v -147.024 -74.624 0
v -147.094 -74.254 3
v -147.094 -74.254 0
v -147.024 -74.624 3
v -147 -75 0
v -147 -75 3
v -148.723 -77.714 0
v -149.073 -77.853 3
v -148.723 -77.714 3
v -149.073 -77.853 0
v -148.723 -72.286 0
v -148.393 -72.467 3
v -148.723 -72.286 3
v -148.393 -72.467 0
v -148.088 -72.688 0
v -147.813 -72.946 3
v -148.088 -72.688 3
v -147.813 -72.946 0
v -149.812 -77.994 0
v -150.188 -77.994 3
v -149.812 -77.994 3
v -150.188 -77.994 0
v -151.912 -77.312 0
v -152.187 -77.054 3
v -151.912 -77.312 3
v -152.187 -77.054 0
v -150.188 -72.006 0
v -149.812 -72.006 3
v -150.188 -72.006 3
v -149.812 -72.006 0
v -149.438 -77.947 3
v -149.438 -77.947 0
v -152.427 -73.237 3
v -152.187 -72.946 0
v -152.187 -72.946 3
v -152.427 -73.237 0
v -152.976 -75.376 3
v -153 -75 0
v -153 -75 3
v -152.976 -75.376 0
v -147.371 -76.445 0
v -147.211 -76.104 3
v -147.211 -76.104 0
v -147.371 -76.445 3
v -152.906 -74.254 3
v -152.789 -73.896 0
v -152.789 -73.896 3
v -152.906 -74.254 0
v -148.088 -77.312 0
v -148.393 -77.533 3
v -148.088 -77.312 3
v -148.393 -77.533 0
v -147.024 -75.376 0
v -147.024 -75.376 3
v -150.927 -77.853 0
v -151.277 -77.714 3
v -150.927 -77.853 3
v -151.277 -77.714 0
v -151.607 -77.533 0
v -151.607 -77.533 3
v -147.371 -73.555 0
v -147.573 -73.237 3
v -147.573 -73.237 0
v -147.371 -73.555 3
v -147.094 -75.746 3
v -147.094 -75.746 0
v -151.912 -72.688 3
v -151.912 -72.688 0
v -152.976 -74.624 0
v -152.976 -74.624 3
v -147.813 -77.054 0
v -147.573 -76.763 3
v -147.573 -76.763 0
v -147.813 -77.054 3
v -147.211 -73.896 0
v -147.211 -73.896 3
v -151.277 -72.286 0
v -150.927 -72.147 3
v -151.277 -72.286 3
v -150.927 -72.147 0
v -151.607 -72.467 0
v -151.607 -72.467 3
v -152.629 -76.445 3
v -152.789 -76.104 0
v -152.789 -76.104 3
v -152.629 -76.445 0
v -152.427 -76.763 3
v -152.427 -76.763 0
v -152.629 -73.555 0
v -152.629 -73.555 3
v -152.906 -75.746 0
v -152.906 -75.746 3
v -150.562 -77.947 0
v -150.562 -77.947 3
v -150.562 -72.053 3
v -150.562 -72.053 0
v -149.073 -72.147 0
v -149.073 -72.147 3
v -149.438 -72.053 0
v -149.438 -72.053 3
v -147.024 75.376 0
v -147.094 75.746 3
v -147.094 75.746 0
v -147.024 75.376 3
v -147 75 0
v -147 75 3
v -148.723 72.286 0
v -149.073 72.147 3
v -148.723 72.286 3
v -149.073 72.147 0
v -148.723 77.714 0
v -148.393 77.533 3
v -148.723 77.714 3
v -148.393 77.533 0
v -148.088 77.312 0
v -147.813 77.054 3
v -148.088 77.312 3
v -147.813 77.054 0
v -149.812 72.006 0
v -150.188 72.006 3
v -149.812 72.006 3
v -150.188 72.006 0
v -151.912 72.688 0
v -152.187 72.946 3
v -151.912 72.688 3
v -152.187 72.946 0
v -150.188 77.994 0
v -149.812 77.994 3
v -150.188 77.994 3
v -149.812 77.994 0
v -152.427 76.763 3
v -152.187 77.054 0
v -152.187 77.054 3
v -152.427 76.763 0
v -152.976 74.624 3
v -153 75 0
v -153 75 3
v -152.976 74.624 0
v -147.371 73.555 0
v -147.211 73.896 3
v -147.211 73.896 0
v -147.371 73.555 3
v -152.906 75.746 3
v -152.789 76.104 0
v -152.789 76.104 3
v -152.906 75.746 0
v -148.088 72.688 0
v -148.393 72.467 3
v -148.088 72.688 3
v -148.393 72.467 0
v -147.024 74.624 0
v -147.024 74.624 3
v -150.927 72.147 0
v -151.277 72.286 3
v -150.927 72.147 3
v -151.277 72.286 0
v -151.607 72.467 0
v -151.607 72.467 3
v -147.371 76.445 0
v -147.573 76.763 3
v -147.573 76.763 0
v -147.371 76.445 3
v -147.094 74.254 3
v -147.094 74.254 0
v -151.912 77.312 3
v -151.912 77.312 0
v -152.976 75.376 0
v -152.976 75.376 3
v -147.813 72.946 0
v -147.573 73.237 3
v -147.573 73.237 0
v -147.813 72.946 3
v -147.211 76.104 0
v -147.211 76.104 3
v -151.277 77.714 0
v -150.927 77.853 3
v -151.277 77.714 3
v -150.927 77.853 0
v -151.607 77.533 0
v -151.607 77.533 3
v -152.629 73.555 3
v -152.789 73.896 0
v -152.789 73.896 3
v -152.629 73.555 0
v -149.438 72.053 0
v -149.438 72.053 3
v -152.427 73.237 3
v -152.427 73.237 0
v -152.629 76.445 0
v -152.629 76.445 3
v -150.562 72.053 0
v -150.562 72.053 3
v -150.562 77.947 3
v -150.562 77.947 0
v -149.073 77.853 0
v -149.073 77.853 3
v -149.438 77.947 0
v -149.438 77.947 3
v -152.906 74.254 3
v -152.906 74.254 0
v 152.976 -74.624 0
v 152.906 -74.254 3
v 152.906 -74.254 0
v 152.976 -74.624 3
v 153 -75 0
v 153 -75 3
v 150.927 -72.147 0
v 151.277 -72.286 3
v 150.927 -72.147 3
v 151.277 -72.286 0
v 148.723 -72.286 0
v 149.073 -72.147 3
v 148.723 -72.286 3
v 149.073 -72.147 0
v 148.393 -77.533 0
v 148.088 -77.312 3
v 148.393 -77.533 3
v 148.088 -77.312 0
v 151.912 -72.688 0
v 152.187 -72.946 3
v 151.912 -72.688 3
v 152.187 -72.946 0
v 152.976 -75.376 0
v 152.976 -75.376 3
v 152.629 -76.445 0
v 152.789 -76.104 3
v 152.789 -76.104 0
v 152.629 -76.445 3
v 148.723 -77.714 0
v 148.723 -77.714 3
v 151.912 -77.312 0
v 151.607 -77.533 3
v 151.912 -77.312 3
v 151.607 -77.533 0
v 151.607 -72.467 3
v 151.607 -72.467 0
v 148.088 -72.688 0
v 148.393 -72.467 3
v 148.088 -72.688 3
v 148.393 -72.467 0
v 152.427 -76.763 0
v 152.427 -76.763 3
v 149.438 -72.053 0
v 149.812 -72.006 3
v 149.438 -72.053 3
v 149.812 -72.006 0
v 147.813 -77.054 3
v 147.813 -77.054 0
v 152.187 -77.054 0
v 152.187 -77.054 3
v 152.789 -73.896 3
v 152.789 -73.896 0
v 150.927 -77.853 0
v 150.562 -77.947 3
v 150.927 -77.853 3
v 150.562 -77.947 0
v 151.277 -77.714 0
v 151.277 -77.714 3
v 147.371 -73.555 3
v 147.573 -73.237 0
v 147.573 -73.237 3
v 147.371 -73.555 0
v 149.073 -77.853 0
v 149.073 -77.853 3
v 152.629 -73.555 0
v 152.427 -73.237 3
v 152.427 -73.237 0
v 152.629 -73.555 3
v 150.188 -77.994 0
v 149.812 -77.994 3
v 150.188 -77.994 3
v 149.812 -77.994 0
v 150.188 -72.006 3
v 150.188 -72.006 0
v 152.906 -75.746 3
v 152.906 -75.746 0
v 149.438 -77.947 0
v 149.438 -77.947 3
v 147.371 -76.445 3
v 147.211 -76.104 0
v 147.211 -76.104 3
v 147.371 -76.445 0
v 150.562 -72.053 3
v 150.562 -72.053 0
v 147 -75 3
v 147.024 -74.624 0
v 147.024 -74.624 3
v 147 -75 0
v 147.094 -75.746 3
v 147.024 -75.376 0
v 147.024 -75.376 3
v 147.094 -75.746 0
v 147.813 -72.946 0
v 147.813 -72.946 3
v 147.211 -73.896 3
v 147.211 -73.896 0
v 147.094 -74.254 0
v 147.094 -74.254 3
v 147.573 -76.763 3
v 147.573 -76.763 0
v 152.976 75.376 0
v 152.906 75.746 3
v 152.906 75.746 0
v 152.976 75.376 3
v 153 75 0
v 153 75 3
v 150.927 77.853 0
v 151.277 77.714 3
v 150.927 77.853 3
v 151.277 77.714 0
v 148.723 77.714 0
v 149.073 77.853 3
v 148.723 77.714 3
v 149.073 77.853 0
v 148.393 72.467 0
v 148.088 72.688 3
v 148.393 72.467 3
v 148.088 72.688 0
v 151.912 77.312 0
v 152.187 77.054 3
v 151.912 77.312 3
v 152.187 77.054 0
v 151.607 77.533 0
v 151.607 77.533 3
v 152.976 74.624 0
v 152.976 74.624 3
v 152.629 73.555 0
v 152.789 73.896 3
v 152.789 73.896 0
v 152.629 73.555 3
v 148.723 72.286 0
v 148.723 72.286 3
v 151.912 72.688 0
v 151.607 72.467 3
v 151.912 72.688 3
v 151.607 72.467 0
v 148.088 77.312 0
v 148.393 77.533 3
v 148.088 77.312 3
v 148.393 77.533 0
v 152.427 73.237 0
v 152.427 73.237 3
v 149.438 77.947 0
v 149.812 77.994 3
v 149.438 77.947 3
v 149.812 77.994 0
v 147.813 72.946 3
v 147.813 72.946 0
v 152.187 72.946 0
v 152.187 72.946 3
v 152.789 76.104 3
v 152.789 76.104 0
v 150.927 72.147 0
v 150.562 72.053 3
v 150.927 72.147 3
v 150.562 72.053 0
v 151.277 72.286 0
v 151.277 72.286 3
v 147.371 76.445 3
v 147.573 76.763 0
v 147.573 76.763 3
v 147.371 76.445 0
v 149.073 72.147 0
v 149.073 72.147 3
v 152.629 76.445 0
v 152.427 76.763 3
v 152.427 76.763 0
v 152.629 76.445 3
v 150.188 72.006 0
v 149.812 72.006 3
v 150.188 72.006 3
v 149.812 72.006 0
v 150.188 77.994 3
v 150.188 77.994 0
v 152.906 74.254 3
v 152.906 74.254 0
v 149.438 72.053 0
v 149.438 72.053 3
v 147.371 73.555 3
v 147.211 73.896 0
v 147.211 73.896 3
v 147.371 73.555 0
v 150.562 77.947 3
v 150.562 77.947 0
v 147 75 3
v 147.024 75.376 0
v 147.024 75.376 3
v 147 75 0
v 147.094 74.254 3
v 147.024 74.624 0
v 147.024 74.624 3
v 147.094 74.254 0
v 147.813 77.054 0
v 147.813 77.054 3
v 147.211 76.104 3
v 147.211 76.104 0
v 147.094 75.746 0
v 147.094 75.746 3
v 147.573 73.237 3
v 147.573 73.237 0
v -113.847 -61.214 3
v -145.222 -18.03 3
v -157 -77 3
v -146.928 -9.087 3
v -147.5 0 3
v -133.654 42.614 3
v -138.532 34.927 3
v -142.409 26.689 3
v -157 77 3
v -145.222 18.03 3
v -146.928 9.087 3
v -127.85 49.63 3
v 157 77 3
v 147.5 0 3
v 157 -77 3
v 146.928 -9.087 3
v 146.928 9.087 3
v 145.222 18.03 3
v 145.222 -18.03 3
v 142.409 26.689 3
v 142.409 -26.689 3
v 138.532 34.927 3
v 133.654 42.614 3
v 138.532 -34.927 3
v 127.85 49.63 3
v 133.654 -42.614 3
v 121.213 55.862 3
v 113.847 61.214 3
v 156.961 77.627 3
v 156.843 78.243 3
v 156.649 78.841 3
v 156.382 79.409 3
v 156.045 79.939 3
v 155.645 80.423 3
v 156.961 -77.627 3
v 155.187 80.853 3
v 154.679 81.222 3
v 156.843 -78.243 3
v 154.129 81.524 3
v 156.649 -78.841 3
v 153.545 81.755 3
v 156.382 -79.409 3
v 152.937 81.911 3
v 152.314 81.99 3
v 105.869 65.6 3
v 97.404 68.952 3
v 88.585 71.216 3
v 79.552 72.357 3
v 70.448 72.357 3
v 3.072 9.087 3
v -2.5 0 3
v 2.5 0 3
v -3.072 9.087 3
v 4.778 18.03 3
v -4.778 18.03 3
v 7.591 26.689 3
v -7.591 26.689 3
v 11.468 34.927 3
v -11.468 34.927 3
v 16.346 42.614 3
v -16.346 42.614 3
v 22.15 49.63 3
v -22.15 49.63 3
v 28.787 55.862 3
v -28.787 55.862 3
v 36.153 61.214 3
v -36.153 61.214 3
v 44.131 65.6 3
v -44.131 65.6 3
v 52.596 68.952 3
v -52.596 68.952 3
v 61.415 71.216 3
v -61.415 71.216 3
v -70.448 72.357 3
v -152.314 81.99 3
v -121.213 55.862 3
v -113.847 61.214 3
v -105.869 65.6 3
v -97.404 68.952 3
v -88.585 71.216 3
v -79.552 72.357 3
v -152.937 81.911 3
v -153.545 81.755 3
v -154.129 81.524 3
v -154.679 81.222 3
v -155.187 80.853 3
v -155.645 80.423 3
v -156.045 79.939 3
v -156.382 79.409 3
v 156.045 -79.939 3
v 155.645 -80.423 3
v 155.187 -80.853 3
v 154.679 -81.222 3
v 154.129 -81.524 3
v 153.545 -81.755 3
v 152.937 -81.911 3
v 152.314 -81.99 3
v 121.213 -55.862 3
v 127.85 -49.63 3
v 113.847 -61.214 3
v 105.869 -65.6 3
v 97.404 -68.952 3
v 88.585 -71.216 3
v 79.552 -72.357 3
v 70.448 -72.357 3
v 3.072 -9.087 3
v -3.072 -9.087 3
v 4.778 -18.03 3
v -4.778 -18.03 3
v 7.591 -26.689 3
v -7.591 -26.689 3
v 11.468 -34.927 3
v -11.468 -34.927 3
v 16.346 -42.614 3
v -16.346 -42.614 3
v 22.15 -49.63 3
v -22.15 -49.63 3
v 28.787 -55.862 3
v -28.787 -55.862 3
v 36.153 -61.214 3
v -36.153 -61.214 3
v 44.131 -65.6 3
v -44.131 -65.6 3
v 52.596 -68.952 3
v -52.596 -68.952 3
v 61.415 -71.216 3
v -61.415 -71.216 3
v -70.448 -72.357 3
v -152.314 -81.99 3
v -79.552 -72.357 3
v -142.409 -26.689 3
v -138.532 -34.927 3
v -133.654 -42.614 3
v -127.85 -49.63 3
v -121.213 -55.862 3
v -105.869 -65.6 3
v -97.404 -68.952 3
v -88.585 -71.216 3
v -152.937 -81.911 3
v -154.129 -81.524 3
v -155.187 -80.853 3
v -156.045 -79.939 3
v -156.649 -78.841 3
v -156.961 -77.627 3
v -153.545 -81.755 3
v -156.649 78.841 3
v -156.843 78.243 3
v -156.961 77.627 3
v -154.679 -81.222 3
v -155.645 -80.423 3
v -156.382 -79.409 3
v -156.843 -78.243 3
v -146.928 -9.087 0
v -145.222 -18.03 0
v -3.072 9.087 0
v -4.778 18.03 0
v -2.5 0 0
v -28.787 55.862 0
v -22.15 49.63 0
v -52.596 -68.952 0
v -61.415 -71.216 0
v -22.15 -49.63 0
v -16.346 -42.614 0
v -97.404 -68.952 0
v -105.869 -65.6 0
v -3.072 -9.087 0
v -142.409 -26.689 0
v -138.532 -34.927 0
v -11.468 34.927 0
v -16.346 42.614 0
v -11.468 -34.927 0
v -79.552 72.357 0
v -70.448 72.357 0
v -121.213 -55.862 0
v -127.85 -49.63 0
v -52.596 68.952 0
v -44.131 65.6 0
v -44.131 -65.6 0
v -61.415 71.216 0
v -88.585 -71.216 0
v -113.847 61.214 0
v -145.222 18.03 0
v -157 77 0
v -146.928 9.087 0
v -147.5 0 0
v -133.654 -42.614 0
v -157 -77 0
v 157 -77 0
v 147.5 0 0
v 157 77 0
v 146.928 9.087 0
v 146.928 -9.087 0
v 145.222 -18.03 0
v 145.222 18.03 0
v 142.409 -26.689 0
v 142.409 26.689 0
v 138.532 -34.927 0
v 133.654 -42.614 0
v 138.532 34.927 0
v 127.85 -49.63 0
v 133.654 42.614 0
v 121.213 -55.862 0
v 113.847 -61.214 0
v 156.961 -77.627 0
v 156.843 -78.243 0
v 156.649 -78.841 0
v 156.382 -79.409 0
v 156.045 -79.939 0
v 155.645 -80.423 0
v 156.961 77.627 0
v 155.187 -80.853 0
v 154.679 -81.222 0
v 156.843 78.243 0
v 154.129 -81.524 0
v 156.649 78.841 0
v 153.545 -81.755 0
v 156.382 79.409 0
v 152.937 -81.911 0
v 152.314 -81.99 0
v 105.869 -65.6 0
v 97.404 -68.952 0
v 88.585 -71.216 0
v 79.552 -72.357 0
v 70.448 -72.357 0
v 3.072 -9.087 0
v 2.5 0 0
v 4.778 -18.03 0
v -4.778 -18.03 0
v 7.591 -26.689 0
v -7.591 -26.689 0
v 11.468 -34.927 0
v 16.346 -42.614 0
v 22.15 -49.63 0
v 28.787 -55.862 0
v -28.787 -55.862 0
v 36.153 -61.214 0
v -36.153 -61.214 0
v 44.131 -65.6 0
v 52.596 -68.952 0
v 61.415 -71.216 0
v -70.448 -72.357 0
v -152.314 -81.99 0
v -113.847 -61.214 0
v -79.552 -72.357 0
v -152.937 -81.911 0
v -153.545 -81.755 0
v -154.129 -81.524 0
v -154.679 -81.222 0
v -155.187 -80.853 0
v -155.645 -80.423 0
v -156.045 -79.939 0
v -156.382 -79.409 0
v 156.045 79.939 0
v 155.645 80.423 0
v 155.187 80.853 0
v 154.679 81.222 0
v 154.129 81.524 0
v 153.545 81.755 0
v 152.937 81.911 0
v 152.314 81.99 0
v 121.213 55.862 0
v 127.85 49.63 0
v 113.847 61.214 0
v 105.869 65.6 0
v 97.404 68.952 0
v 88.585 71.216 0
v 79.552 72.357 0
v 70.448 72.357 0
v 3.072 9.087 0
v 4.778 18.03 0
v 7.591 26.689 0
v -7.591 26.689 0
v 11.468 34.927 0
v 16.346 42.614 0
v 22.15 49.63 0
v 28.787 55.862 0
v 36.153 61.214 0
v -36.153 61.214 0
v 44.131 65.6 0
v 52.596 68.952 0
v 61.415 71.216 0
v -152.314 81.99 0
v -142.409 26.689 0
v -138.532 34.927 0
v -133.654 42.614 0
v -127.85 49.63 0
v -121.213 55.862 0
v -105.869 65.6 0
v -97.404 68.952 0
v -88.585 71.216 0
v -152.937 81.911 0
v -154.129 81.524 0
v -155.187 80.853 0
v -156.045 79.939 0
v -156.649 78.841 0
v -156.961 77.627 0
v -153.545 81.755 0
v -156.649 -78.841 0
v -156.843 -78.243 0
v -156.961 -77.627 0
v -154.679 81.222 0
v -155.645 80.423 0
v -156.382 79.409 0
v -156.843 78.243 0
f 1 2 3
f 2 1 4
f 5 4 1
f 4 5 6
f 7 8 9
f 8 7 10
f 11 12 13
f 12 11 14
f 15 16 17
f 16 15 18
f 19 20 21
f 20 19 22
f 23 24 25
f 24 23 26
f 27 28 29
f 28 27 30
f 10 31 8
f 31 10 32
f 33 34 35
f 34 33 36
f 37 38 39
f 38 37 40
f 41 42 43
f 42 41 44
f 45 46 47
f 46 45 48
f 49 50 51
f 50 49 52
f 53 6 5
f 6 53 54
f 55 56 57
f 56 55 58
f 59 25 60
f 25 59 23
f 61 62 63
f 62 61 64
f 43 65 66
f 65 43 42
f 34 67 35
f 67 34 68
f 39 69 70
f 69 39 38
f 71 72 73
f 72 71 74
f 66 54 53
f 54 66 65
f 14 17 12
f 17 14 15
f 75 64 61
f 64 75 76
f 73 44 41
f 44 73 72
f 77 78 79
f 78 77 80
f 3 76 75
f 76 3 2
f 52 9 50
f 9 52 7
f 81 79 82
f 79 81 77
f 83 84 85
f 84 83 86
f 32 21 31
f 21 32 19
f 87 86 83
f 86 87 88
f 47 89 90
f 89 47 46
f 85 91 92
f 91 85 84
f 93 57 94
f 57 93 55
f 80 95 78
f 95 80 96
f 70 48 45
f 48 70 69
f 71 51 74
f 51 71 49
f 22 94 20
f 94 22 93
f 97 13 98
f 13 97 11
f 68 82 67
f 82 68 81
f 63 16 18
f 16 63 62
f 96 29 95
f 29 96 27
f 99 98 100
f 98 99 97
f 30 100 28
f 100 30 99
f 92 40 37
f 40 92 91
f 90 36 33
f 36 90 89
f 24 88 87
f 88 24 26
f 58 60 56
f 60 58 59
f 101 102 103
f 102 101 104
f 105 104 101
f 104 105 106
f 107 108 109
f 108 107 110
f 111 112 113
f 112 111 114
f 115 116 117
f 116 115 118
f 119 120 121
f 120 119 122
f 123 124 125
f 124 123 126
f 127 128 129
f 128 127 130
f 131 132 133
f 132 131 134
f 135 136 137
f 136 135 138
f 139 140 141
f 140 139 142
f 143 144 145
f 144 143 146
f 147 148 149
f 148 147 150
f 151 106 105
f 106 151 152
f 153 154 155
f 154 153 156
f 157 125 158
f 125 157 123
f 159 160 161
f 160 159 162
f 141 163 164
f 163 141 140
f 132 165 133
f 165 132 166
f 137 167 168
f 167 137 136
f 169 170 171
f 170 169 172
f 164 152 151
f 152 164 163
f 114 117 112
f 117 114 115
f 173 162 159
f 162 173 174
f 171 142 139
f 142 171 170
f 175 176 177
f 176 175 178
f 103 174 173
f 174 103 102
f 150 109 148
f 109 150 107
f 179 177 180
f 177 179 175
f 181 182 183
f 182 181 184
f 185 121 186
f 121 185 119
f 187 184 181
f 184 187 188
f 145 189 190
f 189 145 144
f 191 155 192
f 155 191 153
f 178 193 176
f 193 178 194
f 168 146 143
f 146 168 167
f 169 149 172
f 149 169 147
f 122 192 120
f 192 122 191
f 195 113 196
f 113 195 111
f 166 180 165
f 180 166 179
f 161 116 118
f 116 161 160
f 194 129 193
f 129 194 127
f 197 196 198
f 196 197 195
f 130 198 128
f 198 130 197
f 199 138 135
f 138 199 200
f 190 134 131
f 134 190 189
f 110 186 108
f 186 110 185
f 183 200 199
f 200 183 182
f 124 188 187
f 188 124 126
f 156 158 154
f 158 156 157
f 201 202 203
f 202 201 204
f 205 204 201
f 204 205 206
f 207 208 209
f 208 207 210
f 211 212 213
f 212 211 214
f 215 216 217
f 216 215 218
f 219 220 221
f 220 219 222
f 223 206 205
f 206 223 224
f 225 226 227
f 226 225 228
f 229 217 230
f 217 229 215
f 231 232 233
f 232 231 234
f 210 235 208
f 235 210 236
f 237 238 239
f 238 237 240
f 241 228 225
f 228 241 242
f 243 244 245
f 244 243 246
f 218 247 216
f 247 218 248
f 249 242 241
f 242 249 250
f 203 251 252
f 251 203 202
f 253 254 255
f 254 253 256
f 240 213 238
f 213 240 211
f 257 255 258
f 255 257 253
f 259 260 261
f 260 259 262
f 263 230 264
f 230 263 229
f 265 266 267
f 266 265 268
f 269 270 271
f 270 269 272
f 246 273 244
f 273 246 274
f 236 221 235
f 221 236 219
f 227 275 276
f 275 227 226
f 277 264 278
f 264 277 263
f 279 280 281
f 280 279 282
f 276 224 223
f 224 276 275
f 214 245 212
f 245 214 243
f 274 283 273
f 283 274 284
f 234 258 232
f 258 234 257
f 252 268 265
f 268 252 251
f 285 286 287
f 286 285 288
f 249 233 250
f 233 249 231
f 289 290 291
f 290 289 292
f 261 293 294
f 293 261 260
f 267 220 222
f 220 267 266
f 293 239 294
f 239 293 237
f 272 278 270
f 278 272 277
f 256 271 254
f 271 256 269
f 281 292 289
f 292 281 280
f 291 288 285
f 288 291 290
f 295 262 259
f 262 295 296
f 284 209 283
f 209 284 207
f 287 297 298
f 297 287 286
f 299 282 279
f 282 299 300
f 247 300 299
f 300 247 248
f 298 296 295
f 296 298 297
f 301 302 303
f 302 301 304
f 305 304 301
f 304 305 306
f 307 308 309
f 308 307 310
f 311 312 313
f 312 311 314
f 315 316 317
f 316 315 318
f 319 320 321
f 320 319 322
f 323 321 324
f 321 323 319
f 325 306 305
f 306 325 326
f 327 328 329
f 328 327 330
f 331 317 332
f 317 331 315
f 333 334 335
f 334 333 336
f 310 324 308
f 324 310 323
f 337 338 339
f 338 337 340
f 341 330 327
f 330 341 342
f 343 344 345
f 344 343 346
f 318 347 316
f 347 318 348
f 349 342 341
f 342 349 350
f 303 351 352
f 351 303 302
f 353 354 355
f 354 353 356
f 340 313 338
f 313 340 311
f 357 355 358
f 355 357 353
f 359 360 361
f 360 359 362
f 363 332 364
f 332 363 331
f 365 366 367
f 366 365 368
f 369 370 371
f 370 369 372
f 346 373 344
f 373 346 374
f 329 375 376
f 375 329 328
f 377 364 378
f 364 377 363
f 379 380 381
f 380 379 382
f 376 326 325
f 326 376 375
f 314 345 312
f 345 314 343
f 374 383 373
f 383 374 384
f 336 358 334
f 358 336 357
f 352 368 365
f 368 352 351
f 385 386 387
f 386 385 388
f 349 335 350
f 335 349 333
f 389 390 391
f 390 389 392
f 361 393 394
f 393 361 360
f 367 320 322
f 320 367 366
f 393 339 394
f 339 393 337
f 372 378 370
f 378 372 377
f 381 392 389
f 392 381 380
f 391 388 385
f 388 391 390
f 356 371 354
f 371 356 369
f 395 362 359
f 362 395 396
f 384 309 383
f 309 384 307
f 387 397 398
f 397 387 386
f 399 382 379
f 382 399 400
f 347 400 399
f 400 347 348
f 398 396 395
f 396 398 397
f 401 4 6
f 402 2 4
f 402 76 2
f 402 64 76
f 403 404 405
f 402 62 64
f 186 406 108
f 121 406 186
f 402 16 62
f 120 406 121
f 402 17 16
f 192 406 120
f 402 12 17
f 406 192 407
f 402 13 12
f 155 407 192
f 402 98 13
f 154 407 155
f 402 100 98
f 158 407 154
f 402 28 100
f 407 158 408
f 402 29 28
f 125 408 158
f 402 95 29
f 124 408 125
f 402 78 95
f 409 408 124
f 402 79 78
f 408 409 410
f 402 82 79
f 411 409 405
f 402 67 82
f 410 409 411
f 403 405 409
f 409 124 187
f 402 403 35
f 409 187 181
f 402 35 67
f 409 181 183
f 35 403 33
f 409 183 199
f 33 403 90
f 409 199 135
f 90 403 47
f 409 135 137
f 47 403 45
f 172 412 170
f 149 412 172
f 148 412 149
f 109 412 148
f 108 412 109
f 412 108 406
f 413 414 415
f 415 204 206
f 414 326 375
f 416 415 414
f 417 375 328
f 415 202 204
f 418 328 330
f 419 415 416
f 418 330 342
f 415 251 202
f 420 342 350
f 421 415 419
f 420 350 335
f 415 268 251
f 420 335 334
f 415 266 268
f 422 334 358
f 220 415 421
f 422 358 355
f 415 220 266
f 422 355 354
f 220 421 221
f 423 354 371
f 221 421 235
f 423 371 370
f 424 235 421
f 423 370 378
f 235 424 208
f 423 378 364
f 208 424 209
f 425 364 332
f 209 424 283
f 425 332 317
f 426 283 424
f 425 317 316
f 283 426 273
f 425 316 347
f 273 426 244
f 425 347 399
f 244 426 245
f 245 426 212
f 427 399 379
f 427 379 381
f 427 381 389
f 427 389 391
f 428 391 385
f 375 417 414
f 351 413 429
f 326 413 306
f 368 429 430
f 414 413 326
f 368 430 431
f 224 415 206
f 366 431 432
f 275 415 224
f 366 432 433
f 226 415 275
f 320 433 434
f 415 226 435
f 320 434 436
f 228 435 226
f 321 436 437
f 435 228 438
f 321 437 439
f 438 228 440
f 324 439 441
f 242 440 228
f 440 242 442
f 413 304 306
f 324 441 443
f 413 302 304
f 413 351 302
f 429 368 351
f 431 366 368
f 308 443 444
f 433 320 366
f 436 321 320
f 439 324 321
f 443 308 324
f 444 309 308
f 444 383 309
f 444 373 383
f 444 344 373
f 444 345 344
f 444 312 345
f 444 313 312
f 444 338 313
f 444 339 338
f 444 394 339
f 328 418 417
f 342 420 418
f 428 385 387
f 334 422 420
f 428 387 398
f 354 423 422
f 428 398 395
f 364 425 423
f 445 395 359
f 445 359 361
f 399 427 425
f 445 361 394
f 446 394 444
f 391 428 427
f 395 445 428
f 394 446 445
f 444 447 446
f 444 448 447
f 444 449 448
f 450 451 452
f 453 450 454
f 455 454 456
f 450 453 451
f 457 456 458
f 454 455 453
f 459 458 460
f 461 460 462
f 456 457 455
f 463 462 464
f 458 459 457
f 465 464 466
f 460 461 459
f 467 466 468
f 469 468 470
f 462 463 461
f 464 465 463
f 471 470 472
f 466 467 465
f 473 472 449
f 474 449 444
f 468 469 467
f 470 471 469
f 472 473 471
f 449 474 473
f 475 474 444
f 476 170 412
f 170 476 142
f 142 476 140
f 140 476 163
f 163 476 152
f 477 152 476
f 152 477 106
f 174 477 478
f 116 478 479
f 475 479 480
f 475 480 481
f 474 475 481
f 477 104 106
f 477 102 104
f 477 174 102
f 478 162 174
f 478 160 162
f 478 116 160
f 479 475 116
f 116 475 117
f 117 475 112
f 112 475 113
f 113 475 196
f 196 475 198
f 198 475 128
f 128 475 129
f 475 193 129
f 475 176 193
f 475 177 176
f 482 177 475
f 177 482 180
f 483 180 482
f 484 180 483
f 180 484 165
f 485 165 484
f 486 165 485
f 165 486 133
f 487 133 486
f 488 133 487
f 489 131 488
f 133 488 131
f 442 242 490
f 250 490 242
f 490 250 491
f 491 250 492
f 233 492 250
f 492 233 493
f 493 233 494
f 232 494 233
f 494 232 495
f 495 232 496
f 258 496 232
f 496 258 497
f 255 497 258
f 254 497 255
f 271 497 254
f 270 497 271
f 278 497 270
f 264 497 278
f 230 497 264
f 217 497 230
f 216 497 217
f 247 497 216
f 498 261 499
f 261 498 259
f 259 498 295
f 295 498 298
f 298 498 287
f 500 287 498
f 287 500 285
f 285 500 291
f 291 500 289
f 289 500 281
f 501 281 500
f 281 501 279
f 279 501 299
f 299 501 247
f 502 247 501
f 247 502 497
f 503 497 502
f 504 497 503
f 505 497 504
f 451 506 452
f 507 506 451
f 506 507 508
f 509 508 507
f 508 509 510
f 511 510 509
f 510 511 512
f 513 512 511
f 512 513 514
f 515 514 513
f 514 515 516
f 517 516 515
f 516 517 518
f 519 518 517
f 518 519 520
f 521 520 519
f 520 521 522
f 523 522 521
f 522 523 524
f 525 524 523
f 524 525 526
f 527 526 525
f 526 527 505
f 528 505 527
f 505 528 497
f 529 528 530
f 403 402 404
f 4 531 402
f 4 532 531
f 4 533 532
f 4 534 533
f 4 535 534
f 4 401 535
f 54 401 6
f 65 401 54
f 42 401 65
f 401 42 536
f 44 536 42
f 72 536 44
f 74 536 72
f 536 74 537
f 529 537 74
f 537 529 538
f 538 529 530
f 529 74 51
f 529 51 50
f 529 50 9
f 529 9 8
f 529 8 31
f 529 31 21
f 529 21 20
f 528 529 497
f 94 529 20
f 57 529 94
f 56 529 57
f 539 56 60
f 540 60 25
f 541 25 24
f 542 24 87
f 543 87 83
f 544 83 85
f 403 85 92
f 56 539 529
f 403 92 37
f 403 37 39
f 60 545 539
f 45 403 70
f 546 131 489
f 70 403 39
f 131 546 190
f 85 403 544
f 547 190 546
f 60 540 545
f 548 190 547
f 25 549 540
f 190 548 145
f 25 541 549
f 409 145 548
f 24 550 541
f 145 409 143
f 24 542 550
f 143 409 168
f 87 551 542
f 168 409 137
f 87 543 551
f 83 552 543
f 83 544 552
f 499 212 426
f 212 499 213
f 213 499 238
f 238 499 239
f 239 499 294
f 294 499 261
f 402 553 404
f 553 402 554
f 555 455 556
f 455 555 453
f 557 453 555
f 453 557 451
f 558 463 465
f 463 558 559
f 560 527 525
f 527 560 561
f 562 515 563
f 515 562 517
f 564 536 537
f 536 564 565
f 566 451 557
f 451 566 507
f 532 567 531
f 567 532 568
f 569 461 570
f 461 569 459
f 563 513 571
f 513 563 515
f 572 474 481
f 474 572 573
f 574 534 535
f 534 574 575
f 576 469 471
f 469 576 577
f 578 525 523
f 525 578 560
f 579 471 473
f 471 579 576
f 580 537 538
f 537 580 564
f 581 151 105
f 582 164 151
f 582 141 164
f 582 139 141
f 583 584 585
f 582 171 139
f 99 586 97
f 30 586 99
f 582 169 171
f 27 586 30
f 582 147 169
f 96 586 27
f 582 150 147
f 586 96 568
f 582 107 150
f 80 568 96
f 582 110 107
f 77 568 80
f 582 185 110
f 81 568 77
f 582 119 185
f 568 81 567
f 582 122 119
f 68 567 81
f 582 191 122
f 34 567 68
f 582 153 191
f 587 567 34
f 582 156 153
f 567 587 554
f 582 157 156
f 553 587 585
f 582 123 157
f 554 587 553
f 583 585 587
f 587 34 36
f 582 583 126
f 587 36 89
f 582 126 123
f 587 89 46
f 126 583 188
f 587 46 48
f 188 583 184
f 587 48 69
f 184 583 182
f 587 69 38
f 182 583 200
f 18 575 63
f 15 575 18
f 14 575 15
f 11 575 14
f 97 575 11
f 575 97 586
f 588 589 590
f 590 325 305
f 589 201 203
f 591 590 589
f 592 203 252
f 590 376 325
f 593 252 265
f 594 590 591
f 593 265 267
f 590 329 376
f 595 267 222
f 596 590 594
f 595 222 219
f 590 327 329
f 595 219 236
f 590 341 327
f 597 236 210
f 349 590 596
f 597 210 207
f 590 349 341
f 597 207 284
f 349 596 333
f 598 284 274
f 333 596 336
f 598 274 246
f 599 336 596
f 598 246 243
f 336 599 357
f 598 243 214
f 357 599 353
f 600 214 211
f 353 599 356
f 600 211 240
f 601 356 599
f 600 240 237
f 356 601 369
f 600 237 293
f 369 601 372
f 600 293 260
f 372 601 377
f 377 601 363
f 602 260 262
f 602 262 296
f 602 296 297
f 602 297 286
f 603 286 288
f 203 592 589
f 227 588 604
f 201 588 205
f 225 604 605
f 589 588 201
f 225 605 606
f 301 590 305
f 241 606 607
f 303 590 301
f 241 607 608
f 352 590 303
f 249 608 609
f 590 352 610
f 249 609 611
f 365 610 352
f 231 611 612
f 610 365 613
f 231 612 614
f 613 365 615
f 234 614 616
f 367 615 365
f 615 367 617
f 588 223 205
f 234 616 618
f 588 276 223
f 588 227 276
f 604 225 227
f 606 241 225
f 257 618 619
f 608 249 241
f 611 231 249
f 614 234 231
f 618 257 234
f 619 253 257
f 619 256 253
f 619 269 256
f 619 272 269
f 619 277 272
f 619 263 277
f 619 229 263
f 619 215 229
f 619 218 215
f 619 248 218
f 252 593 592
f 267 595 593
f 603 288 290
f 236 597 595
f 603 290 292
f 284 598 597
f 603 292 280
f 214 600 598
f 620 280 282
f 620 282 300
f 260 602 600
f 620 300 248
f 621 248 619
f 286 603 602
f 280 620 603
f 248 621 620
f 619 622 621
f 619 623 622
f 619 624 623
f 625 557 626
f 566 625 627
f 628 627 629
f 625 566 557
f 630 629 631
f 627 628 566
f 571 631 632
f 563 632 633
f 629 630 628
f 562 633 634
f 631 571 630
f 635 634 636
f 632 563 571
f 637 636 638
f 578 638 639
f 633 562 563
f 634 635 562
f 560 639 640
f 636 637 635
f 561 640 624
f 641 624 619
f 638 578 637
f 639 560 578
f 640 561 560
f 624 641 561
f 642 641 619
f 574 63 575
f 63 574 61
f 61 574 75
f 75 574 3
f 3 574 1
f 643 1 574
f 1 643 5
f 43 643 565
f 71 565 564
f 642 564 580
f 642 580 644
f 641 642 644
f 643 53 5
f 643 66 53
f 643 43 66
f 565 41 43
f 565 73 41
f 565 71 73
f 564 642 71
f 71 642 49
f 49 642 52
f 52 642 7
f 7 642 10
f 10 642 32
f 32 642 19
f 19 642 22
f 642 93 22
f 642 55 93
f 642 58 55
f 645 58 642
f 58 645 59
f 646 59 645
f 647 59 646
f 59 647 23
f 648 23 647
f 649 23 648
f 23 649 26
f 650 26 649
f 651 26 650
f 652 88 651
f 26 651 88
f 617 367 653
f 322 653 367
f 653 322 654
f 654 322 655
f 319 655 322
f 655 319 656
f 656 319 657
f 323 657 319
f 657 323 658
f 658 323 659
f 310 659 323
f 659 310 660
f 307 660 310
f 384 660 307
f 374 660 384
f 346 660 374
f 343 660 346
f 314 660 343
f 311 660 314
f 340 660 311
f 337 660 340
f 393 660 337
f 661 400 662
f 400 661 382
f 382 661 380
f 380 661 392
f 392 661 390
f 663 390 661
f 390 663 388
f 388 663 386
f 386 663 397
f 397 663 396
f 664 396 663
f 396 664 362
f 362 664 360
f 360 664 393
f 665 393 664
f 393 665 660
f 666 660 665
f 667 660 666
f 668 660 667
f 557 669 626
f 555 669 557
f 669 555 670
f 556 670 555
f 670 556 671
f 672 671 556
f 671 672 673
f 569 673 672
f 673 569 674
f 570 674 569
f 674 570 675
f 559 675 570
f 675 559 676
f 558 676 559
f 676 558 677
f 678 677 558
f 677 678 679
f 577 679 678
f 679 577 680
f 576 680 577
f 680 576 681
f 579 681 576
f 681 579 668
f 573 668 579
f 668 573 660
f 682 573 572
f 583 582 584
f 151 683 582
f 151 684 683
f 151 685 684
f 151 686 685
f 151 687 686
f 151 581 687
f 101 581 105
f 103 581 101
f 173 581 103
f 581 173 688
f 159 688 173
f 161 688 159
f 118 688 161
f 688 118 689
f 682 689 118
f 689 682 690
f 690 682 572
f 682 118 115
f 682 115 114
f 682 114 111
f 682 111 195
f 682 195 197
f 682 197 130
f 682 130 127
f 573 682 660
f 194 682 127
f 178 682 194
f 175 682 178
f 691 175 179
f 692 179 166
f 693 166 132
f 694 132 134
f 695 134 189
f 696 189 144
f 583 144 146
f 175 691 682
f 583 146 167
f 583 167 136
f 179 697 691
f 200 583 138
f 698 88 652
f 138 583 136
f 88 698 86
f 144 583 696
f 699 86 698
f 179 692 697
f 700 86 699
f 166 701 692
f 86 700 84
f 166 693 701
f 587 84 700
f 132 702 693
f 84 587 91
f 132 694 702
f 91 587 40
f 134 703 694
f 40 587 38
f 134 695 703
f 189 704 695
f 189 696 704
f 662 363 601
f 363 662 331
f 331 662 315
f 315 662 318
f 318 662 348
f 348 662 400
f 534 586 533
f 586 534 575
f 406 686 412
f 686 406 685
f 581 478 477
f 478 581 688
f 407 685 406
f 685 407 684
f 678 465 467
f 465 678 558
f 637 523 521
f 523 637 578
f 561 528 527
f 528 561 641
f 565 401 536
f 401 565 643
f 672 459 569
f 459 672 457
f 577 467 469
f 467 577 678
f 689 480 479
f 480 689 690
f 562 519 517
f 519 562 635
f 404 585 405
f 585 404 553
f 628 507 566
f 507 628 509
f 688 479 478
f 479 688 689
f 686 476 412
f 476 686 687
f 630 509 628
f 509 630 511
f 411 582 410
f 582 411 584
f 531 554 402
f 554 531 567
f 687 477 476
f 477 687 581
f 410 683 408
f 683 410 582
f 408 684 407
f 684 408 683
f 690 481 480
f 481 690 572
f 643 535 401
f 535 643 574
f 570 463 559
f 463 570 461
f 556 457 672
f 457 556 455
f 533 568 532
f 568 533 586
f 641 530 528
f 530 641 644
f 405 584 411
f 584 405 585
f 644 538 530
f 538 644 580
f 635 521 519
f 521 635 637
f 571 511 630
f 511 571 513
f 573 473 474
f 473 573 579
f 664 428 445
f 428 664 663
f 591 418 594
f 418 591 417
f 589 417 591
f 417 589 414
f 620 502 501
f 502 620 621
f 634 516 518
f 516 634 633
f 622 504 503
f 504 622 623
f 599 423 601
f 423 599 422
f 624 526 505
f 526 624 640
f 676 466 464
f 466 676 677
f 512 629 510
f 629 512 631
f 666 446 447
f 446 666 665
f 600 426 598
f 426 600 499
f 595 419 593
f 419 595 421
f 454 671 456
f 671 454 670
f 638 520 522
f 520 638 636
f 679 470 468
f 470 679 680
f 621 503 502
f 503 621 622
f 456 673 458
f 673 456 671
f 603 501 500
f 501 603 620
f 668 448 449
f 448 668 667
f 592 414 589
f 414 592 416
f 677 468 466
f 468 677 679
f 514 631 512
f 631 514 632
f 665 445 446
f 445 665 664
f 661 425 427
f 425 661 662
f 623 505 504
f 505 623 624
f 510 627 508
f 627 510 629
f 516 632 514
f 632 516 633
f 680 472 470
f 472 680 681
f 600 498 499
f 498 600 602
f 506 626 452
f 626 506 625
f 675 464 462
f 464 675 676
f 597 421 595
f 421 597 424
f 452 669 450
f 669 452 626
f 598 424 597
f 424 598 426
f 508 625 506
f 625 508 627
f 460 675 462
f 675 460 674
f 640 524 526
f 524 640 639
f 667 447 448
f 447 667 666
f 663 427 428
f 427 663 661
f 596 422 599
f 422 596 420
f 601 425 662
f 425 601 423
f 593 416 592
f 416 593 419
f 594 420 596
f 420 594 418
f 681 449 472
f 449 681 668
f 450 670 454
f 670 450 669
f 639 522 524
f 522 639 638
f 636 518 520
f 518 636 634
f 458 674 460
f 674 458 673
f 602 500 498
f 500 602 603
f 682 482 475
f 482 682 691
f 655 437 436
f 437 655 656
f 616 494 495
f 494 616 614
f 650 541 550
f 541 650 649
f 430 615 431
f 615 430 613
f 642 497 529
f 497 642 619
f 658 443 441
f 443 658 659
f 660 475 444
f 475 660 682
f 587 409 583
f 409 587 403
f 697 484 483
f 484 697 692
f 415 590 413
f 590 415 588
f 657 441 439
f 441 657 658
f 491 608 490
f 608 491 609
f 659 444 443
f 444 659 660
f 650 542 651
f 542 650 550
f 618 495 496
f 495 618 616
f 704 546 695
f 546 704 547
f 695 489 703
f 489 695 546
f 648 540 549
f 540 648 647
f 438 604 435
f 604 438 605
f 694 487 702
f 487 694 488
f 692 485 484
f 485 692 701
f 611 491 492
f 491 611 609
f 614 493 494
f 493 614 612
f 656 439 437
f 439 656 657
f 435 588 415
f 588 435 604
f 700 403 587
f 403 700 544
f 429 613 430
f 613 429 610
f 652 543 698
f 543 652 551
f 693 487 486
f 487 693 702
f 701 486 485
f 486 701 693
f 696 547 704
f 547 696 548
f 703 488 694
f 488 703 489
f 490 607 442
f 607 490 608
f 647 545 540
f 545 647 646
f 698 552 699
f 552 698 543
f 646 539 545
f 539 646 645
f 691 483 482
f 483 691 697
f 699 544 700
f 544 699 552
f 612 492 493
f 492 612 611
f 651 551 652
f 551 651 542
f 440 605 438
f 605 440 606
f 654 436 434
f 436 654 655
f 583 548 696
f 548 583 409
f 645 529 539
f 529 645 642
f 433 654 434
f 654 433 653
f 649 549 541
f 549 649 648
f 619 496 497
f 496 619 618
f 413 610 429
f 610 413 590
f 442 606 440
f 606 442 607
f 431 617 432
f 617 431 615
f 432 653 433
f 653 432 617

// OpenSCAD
$fn = 50;


difference() {
	union() {
		hull() {
			translate(v = [-152.0000000000, 77.0000000000, 0]) {
				cylinder(h = 3, r = 5);
			}
			translate(v = [152.0000000000, 77.0000000000, 0]) {
				cylinder(h = 3, r = 5);
			}
			translate(v = [-152.0000000000, -77.0000000000, 0]) {
				cylinder(h = 3, r = 5);
			}
			translate(v = [152.0000000000, -77.0000000000, 0]) {
				cylinder(h = 3, r = 5);
			}
		}
	}
	union() {
		#translate(v = [-150.0000000000, -75.0000000000, -100.0000000000]) {
			cylinder(h = 200, r = 3.0000000000);
		}
		#translate(v = [-150.0000000000, 75.0000000000, -100.0000000000]) {
			cylinder(h = 200, r = 3.0000000000);
		}
		#translate(v = [150.0000000000, -75.0000000000, -100.0000000000]) {
			cylinder(h = 200, r = 3.0000000000);
		}
		#translate(v = [150.0000000000, 75.0000000000, -100.0000000000]) {
			cylinder(h = 200, r = 3.0000000000);
		}
		#translate(v = [-75.0000000000, 0, 0]) {
			cylinder(h = 3, r = 72.5000000000);
		}
		#translate(v = [75.0000000000, 0, 0]) {
			cylinder(h = 3, r = 72.5000000000);
		}
	}
}
